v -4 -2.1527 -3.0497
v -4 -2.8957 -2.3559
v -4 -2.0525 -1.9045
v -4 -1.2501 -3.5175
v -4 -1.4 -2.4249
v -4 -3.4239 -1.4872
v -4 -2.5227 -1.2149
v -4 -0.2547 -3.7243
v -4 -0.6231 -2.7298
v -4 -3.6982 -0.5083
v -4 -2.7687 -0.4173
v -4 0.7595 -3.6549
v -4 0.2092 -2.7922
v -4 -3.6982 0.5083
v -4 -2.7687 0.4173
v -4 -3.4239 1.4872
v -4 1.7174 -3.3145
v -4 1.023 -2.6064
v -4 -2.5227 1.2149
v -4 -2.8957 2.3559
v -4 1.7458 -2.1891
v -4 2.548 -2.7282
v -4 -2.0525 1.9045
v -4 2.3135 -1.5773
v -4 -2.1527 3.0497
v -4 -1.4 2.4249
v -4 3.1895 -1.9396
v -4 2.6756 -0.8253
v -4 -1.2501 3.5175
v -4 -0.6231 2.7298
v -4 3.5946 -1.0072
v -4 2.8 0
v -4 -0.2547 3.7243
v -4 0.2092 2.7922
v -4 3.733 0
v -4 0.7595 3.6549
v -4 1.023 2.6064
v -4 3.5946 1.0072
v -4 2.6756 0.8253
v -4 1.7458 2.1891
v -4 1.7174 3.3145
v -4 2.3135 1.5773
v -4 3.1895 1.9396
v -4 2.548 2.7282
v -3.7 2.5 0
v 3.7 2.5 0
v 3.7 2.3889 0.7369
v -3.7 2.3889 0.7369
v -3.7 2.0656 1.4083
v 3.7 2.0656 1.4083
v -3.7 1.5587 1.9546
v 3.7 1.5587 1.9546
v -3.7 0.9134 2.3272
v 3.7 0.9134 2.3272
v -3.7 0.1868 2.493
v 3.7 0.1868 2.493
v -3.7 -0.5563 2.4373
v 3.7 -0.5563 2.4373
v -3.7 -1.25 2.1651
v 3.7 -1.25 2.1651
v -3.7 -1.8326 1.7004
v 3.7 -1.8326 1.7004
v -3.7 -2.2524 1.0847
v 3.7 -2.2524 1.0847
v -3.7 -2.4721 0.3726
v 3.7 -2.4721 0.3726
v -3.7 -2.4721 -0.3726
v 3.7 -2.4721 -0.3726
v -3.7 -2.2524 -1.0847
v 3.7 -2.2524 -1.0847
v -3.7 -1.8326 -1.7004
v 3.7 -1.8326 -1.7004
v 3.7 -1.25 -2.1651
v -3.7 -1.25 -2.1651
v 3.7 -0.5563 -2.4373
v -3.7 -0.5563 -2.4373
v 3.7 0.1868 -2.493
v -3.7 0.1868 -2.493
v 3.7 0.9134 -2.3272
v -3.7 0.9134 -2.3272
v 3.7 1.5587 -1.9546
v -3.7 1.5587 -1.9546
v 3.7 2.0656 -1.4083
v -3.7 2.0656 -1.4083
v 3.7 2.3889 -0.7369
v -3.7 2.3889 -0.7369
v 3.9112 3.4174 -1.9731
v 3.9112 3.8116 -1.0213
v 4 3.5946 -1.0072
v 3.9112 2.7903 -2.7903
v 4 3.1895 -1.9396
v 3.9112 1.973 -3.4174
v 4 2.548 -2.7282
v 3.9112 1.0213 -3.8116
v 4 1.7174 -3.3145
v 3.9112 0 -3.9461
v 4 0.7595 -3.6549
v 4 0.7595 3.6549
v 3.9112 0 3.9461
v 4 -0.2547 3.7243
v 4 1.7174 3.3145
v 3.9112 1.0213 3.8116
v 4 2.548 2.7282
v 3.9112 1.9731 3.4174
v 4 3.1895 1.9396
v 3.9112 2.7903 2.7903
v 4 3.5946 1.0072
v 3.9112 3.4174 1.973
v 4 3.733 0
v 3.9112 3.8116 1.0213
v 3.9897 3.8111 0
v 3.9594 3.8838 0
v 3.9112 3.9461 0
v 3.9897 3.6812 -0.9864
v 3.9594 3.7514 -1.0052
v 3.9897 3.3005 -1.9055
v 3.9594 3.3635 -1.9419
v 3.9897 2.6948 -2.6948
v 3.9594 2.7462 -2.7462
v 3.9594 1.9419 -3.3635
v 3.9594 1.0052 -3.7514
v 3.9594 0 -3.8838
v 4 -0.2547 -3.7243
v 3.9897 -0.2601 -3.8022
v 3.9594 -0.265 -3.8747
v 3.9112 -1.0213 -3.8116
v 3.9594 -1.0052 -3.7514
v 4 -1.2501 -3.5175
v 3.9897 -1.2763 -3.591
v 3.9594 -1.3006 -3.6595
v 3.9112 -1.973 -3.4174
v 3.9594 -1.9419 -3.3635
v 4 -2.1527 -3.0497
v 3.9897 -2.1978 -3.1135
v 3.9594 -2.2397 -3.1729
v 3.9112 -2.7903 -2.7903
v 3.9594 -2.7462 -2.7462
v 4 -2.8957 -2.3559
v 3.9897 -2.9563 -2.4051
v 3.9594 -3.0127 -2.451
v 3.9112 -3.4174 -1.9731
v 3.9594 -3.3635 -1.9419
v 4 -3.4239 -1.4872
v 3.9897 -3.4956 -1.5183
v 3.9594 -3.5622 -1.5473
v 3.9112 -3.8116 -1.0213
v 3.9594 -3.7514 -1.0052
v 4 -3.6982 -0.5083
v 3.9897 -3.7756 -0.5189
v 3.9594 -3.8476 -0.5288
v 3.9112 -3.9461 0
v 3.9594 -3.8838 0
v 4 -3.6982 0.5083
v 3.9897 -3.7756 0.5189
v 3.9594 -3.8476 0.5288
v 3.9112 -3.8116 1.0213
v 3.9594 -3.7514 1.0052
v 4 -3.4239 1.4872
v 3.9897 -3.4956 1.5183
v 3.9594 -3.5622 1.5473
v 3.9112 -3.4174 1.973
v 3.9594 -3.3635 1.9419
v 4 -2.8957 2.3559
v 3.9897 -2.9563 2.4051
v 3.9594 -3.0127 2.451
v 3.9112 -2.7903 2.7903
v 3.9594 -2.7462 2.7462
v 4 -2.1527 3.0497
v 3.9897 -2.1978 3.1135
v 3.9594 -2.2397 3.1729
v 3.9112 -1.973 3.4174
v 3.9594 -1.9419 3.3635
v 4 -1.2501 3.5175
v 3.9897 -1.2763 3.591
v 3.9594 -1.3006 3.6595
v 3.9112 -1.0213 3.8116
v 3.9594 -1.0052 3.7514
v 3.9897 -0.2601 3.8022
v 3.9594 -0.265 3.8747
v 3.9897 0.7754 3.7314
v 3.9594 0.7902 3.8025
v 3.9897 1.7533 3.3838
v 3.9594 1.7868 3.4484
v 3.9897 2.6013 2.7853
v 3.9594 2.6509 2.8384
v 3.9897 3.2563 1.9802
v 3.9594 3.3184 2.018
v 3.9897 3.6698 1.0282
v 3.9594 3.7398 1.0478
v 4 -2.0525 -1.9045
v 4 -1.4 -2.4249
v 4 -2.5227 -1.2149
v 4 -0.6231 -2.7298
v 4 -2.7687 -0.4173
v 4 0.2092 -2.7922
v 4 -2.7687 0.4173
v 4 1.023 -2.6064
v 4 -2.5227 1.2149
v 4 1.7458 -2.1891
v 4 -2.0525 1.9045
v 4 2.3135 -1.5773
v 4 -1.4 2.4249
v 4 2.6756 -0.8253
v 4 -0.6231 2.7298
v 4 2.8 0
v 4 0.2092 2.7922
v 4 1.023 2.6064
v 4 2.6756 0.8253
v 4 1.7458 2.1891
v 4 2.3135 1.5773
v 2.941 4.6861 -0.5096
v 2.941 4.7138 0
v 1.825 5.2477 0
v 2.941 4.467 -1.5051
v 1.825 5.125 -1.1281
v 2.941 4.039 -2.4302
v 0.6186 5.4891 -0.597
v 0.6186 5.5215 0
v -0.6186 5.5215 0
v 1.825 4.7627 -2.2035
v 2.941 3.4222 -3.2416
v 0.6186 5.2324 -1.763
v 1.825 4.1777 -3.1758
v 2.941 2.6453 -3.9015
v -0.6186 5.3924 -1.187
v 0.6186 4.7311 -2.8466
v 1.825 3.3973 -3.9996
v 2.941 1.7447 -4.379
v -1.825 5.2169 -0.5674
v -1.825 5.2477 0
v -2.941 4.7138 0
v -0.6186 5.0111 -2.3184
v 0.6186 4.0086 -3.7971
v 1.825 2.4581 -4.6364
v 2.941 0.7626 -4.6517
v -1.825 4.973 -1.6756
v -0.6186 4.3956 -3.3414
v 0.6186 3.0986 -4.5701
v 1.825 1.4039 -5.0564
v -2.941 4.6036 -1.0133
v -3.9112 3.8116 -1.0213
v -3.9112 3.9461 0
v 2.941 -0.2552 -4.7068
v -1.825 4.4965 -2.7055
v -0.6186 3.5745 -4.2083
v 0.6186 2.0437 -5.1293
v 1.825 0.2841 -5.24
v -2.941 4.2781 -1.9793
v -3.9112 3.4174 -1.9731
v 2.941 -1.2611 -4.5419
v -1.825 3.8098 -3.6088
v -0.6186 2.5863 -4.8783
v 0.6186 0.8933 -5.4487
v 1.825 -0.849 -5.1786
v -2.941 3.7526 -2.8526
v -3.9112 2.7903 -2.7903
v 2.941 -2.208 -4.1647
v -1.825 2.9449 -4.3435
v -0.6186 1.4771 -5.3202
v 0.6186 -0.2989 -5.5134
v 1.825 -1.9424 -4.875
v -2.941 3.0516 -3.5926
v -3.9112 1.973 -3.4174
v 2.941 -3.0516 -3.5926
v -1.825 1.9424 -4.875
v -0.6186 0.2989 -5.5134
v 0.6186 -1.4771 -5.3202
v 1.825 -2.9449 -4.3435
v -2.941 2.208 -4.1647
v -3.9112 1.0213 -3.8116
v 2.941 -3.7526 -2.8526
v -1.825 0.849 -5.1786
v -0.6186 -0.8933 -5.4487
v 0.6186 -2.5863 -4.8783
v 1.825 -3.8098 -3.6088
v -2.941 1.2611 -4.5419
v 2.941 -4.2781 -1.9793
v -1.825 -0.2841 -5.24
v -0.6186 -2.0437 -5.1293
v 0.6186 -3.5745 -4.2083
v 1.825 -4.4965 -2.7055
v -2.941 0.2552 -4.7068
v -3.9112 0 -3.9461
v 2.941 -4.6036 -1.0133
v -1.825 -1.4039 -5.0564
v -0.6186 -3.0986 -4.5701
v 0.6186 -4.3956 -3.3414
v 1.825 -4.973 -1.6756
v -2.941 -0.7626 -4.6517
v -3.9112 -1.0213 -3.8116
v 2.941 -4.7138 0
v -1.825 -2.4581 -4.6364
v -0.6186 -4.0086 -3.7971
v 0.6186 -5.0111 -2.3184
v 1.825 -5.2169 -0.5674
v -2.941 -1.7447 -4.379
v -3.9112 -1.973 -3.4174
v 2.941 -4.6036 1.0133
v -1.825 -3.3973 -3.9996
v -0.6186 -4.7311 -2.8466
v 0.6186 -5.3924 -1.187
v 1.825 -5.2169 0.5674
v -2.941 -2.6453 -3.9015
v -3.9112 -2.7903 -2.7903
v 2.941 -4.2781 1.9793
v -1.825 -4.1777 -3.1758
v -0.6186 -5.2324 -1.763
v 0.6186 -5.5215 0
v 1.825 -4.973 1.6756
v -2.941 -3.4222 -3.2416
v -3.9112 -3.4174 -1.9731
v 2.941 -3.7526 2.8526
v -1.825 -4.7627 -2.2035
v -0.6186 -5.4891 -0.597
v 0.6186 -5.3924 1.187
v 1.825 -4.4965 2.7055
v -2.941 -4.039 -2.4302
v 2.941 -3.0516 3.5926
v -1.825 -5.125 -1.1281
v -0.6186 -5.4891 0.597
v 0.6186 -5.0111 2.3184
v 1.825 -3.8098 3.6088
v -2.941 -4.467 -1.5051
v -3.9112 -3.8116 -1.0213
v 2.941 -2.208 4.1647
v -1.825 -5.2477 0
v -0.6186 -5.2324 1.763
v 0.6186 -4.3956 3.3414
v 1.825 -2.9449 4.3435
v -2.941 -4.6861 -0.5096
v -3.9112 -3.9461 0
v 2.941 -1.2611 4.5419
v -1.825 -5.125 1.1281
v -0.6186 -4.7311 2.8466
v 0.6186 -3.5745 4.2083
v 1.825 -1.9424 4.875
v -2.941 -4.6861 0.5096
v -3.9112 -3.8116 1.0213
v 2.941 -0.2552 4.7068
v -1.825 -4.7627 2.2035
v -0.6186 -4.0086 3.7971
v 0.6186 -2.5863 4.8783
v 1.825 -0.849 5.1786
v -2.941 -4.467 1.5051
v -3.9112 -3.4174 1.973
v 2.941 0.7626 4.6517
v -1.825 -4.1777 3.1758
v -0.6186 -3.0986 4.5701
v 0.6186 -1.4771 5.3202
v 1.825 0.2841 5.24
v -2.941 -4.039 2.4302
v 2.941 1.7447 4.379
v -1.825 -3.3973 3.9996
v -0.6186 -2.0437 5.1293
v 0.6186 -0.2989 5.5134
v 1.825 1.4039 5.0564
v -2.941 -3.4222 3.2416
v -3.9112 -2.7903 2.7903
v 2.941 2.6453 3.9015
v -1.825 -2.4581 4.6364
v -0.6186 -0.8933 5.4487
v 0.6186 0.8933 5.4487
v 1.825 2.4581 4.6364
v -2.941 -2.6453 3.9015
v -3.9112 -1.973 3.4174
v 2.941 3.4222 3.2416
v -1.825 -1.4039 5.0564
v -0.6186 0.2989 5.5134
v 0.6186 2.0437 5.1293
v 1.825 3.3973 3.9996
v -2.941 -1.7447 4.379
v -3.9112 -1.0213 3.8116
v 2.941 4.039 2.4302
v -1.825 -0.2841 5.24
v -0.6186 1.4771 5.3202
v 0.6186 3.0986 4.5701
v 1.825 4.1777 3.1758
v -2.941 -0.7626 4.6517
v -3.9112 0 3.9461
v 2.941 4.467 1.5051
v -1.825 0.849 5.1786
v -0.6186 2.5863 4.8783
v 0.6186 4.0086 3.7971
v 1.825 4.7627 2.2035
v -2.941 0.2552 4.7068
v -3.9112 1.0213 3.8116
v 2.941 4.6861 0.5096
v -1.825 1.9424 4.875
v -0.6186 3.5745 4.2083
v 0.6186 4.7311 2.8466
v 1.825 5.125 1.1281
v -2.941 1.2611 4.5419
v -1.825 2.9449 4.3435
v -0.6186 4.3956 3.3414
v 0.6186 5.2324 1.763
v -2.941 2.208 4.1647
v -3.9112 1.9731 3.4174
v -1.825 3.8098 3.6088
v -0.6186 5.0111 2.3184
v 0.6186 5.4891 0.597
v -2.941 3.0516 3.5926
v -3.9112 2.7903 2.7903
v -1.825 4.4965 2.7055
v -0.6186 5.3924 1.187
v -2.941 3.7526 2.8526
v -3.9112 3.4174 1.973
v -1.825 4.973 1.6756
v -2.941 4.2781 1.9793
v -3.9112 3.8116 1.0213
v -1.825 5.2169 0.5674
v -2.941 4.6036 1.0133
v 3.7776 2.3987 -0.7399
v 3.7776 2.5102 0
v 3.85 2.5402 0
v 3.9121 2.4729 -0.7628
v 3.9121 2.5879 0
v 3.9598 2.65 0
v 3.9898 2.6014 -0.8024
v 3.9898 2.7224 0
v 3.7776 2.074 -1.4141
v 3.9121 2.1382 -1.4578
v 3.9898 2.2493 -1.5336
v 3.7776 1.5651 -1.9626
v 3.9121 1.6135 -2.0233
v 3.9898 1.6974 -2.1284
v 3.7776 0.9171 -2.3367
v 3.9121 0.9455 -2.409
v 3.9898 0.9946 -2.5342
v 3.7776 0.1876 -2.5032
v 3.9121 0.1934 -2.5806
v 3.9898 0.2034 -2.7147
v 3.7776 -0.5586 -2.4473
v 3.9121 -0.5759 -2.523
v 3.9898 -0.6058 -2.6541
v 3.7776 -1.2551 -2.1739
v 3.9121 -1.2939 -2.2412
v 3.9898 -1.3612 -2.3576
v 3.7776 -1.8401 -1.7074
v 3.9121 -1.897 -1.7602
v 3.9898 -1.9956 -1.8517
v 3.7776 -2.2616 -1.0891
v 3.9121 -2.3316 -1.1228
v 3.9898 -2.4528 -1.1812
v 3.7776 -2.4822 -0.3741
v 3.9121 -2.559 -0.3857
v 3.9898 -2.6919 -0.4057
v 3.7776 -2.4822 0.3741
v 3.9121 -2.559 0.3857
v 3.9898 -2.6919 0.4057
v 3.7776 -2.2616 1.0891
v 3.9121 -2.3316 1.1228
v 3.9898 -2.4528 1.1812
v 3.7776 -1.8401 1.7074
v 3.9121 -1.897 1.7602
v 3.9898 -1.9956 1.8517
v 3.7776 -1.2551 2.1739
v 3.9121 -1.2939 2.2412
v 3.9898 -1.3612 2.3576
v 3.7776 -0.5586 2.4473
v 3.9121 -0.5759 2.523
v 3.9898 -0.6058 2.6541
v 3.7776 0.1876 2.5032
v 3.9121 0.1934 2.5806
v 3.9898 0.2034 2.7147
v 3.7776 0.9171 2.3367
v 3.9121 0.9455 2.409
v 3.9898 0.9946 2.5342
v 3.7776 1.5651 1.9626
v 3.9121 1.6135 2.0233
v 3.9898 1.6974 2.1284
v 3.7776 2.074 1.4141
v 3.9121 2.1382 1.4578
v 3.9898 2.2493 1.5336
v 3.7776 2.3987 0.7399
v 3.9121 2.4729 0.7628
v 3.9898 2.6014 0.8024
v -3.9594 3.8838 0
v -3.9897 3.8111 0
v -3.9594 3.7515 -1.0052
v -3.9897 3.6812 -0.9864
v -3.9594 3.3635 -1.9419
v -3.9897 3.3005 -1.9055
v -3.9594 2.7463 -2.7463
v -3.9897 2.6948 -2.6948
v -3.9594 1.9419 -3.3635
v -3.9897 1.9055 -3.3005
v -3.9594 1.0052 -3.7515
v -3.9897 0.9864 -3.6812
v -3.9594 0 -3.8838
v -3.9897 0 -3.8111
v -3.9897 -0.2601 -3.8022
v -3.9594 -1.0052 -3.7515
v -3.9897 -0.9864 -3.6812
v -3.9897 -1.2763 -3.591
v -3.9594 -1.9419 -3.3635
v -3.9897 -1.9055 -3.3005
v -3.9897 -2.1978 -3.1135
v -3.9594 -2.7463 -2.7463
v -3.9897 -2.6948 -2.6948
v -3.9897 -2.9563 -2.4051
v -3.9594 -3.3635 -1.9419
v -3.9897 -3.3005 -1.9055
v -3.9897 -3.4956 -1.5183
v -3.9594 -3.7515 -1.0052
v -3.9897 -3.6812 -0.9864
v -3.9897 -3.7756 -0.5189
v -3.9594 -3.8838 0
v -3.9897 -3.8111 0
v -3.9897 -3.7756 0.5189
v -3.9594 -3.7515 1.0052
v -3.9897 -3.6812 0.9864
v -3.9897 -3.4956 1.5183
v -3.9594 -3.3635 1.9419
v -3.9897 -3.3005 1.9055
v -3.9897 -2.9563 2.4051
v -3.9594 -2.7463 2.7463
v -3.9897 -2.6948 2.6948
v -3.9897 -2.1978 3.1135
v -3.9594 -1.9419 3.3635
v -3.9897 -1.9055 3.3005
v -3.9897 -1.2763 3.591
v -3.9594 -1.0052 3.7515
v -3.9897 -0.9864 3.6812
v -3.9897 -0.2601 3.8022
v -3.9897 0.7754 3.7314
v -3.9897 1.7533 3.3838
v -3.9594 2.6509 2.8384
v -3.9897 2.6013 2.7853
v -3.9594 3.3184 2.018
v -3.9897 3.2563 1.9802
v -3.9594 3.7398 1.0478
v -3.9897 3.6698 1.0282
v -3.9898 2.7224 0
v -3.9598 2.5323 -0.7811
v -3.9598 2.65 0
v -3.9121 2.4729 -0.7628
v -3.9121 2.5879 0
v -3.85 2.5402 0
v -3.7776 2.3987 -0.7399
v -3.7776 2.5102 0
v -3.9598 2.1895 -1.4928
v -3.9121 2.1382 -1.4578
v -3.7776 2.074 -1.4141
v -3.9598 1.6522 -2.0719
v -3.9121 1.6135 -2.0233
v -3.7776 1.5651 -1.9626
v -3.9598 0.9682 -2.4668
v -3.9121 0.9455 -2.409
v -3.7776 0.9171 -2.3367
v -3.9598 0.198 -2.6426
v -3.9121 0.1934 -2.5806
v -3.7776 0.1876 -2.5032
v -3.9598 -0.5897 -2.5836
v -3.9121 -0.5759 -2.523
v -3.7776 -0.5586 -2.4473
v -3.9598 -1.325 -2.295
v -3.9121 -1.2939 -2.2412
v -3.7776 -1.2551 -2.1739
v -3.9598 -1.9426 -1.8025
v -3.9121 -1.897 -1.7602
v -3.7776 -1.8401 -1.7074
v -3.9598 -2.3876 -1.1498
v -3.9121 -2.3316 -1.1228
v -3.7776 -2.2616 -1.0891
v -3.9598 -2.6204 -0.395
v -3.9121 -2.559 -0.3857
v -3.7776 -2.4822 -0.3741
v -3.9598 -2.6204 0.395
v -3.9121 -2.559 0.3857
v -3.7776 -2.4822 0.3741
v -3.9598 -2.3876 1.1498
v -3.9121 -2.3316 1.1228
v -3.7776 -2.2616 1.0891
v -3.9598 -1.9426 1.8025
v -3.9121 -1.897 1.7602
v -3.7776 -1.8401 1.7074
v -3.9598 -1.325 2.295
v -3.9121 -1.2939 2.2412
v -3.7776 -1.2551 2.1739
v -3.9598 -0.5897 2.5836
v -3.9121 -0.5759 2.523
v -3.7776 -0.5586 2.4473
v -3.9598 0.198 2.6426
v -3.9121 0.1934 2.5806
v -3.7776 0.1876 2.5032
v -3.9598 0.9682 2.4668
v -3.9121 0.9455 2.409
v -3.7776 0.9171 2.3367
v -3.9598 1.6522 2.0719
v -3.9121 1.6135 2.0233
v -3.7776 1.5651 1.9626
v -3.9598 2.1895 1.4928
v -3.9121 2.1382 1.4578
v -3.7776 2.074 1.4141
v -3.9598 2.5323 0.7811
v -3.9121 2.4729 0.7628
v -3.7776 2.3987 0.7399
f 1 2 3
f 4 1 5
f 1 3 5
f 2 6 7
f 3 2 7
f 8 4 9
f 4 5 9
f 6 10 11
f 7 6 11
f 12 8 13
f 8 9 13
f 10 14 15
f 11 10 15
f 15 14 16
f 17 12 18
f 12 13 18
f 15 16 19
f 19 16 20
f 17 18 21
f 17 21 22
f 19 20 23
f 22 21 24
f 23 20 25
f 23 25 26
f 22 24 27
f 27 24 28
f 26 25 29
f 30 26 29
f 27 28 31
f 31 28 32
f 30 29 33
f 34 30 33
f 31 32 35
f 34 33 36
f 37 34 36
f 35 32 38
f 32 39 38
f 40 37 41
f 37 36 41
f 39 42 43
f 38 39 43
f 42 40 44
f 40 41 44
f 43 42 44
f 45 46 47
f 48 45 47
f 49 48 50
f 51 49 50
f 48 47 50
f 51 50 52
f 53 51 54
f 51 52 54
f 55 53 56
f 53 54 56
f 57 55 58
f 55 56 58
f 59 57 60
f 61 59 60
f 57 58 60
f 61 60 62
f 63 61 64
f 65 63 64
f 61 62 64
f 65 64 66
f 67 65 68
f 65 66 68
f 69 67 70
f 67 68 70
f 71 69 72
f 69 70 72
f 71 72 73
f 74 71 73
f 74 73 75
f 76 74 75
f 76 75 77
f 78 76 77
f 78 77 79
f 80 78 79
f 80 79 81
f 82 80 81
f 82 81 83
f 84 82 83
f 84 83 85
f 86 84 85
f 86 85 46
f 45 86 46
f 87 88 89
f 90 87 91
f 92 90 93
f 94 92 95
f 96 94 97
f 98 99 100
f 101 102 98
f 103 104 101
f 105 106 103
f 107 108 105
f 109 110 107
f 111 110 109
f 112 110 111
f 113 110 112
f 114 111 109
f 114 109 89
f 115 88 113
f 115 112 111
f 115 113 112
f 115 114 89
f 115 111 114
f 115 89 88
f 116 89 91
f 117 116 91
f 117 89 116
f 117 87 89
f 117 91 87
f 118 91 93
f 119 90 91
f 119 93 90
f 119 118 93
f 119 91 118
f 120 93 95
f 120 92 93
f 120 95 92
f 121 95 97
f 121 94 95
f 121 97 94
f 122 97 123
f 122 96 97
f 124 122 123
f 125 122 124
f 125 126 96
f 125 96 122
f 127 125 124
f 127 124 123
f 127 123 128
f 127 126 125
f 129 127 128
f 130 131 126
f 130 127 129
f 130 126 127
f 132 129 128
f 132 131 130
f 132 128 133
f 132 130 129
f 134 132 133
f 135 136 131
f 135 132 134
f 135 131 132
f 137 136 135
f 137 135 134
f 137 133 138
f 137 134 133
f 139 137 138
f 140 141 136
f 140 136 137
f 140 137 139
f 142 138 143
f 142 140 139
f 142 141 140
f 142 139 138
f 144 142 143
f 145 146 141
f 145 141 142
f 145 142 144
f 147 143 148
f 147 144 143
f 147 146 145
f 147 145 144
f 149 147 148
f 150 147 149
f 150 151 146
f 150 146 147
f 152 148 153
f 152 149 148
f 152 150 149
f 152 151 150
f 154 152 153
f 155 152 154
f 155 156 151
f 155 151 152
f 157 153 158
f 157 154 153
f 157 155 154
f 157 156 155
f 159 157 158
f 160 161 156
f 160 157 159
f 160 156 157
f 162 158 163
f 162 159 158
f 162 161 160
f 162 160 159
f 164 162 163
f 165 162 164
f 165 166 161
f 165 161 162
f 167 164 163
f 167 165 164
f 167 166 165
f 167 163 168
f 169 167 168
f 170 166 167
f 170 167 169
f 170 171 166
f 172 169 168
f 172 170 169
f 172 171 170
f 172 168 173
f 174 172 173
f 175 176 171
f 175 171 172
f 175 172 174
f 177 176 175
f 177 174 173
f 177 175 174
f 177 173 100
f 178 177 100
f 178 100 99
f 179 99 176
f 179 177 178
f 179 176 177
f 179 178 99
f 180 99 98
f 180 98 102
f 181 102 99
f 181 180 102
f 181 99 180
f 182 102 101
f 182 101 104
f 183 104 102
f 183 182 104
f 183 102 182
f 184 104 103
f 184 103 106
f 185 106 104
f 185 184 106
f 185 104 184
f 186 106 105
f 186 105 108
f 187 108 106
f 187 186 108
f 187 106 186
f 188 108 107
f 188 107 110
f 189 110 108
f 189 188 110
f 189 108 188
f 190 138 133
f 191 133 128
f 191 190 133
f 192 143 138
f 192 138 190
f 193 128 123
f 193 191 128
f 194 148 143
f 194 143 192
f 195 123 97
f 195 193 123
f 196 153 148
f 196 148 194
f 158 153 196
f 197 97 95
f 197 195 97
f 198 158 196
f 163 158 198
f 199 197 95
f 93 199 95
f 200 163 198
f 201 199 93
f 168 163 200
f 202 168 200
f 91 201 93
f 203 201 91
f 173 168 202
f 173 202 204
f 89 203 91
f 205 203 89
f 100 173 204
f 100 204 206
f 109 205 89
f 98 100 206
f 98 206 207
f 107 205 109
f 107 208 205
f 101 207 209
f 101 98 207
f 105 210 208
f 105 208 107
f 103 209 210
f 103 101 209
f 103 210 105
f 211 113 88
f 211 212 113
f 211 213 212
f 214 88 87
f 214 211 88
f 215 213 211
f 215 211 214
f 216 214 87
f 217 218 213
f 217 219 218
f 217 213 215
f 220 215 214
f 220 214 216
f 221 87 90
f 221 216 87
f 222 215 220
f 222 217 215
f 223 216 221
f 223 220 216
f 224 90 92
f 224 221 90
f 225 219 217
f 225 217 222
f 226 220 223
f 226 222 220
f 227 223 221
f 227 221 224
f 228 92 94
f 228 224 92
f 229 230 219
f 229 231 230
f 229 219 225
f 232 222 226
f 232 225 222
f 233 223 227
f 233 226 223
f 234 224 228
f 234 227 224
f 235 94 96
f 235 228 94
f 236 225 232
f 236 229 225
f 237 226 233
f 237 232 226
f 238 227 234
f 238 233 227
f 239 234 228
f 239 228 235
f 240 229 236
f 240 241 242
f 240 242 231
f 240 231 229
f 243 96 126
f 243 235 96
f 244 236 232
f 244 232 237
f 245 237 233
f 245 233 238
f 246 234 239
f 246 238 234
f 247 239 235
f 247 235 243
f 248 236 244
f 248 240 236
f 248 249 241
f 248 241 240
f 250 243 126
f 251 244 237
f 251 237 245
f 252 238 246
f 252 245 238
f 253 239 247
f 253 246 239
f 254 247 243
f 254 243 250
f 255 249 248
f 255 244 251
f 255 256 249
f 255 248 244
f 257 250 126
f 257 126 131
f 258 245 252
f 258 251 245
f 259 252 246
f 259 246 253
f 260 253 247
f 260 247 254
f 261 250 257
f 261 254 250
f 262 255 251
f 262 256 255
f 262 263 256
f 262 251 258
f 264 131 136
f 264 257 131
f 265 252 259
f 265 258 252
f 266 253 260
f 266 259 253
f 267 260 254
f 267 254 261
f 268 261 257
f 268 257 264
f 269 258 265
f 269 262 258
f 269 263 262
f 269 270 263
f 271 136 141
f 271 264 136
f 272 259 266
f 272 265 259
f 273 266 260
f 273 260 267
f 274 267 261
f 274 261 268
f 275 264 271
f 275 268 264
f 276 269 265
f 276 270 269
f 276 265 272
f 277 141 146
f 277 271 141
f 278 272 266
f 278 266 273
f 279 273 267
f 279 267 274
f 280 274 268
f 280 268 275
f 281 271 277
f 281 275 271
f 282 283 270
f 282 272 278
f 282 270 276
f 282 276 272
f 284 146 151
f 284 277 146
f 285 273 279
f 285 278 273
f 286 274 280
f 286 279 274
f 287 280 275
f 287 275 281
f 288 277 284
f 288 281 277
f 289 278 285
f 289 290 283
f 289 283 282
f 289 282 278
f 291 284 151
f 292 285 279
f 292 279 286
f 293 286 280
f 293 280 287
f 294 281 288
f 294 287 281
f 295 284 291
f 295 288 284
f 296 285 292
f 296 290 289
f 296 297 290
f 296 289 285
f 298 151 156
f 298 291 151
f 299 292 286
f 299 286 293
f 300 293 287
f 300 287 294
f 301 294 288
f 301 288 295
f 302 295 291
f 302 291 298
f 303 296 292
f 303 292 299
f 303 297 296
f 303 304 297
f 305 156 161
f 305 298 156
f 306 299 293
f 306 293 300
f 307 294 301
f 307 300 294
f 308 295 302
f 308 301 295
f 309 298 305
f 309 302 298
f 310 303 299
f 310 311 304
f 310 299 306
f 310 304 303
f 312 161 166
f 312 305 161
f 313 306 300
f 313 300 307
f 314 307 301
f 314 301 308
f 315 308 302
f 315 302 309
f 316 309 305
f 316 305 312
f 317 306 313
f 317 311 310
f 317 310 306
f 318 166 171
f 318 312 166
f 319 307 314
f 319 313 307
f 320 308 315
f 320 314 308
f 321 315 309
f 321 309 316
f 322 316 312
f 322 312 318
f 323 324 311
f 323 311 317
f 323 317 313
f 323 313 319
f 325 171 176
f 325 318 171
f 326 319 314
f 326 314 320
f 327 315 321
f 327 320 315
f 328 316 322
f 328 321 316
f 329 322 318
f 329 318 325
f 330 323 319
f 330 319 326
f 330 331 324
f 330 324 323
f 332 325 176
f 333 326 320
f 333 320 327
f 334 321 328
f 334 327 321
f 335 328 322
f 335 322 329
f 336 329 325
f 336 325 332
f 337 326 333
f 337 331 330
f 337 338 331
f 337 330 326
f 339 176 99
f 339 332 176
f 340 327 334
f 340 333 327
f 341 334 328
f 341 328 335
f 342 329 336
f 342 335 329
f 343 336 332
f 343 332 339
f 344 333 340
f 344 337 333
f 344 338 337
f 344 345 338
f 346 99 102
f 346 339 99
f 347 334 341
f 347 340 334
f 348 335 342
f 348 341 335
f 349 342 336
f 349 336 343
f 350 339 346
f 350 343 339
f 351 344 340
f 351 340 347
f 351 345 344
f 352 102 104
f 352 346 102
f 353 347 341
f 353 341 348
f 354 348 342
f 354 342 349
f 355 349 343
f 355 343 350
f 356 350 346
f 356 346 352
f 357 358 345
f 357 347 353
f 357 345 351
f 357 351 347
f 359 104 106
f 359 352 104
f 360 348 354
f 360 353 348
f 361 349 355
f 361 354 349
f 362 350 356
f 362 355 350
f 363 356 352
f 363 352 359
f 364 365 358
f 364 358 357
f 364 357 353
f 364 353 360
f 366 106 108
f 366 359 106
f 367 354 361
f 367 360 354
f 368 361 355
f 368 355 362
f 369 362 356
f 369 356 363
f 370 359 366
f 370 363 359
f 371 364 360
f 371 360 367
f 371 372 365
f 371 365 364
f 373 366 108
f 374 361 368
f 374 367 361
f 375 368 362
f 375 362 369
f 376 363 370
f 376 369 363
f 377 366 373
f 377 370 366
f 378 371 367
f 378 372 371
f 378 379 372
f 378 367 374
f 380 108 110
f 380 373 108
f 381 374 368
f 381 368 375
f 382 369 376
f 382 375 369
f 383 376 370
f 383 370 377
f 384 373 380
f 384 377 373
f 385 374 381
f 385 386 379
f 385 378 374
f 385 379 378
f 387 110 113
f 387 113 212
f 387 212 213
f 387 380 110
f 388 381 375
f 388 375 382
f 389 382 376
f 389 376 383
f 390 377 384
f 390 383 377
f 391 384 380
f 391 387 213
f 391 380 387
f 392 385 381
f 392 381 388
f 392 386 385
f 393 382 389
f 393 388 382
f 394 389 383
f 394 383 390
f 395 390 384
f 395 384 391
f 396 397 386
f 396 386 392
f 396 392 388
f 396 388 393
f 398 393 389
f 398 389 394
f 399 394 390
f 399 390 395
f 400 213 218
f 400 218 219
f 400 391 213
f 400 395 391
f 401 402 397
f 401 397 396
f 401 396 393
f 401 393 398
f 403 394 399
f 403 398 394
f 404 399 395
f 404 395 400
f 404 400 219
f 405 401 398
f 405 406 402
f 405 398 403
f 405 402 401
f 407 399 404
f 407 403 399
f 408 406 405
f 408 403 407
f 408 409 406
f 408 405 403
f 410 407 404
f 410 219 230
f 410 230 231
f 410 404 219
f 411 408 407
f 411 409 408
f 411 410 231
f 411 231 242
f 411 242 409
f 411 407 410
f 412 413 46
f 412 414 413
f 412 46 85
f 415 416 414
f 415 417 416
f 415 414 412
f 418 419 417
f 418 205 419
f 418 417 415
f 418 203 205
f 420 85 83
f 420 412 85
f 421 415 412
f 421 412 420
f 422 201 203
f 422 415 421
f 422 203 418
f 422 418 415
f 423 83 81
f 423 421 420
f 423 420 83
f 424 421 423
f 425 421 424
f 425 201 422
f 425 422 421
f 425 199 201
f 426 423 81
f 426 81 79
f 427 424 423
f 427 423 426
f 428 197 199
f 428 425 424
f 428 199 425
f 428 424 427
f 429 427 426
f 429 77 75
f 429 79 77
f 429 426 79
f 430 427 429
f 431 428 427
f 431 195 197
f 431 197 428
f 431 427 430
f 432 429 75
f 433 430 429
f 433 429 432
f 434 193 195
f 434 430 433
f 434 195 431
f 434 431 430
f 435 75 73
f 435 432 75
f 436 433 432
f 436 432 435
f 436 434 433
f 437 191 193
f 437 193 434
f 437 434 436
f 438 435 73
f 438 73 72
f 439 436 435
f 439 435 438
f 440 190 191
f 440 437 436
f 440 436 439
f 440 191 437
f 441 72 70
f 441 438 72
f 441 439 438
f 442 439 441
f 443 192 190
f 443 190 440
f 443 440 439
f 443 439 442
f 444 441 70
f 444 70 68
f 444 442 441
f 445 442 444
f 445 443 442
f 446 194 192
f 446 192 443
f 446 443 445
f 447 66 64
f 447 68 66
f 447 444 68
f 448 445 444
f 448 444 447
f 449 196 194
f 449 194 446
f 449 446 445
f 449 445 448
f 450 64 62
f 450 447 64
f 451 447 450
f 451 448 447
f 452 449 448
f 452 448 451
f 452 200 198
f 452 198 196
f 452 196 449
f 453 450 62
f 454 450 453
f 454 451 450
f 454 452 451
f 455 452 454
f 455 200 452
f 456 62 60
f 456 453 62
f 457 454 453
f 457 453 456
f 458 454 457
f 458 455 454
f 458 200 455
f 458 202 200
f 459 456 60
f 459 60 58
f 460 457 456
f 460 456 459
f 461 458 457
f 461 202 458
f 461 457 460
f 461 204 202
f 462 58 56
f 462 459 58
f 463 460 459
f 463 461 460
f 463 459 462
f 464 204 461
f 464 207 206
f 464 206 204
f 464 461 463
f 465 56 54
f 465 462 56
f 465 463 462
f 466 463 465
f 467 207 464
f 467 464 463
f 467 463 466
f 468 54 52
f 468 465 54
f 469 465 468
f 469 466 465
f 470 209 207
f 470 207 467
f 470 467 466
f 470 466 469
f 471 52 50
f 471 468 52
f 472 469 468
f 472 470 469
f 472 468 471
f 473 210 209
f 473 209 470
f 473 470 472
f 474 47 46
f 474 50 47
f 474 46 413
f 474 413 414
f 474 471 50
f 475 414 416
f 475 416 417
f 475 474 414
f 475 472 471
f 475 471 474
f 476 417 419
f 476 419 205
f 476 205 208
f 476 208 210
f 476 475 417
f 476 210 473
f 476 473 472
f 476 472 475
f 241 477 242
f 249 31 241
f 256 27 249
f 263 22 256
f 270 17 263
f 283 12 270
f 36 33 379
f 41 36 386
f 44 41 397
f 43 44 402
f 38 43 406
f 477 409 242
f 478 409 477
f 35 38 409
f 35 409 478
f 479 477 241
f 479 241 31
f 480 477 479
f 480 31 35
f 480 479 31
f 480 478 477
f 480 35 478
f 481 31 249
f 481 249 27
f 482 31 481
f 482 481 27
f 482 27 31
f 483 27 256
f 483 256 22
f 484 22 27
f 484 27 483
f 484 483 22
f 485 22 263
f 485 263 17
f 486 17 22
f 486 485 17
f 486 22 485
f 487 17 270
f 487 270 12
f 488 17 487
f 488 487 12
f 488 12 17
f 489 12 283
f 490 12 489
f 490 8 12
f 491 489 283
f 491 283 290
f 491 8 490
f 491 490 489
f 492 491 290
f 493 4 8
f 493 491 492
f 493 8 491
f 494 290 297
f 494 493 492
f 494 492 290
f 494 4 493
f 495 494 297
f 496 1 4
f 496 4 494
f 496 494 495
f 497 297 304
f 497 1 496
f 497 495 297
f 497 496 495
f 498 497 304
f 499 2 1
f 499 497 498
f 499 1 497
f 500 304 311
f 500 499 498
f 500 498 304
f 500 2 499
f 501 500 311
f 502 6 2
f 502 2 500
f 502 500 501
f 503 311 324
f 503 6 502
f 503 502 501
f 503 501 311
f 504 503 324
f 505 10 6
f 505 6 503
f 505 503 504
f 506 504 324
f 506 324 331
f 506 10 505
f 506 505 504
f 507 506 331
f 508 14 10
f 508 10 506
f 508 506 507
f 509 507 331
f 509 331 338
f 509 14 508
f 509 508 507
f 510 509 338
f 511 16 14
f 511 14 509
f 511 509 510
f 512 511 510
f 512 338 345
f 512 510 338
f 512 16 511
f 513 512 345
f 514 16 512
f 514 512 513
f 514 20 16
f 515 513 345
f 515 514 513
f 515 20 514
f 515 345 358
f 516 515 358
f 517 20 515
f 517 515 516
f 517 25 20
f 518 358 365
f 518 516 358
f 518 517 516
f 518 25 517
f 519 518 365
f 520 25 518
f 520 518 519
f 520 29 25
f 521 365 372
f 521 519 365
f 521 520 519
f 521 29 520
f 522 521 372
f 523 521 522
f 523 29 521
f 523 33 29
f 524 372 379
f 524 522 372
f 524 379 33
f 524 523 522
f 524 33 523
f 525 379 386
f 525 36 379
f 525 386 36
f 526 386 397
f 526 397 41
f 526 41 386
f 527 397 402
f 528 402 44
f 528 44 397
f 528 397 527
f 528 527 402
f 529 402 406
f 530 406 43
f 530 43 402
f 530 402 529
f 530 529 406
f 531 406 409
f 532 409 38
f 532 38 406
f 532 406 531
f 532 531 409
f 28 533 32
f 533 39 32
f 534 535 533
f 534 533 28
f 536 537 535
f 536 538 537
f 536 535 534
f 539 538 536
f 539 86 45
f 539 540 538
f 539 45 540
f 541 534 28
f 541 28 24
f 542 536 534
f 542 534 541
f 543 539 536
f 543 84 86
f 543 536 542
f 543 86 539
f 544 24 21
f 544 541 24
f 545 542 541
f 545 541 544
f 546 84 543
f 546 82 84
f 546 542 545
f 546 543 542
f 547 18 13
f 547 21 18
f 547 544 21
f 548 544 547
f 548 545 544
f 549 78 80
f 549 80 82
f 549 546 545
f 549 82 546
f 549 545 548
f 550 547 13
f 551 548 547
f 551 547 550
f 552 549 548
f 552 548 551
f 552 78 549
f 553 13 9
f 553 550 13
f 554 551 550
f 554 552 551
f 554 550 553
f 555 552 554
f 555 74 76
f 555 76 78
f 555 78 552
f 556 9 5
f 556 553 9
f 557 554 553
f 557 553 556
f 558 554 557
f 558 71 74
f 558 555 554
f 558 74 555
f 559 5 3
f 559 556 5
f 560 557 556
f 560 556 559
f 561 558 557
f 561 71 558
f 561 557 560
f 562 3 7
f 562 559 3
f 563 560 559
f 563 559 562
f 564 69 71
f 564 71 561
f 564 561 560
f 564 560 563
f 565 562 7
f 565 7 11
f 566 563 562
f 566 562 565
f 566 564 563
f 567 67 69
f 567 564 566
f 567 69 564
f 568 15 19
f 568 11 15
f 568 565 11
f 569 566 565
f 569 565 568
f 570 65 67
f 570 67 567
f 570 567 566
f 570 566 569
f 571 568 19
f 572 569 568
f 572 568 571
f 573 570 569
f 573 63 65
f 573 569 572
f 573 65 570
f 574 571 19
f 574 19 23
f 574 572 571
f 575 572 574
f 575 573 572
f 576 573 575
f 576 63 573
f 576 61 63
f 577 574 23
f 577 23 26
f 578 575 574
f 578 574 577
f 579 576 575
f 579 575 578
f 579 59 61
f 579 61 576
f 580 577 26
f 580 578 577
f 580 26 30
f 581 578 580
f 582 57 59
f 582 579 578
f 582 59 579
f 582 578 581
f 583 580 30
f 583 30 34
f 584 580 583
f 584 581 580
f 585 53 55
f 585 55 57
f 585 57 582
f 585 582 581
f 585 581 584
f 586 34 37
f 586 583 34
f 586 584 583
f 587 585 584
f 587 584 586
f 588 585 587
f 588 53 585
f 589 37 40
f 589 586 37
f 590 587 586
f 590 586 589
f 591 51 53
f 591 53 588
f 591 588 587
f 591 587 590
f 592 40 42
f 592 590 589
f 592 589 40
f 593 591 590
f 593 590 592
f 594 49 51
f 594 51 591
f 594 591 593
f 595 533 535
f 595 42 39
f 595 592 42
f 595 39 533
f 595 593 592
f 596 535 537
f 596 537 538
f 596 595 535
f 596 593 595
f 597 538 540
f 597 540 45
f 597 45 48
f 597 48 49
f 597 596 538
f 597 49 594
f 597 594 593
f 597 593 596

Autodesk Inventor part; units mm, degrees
sketch "Sketch_1" plane through (0, 0, 0) normal (0, 0, 1) x (1, 0, 0)
  line L0 (4, 0) -> (-4, 0)
  arc A0 (-4, 2.8) -> (-3.7, 2.5) centre (-3.7, 2.8) ccw
  line L1 (-3.7, 2.5) -> (3.7, 2.5)
  arc A1 (3.7, 2.5) -> (4, 2.8) centre (3.7, 2.8) ccw
  line L2 (4, 2.8) -> (4, 3.733)
  arc A2 (4, 3.733) -> (3.9112, 3.9461) centre (3.7, 3.733) ccw
  arc A3 (3.9112, 3.9461) -> (-3.9112, 3.9461) centre (0, 0) ccw
  arc A4 (-3.9112, 3.9461) -> (-4, 3.733) centre (-3.7, 3.733) ccw
  line L3 (-4, 3.733) -> (-4, 2.8)
revolve "Revolution1" add sketch "Sketch_1" angle 360 about axis through (4, 0, 0) along (1, 0, 0)
ref_plane "ball_XY" through (0, 0, 0) normal (1, 0, 0) x (0, 0, -1)
ref_plane "ball_YZ" through (0, 0, 0) normal (0, 0, -1) x (0, 1, 0)
ref_plane "ball_ZX" through (0, 0, 0) normal (0, 1, 0) x (1, 0, 0)
properties part number "RBPB5ball"
